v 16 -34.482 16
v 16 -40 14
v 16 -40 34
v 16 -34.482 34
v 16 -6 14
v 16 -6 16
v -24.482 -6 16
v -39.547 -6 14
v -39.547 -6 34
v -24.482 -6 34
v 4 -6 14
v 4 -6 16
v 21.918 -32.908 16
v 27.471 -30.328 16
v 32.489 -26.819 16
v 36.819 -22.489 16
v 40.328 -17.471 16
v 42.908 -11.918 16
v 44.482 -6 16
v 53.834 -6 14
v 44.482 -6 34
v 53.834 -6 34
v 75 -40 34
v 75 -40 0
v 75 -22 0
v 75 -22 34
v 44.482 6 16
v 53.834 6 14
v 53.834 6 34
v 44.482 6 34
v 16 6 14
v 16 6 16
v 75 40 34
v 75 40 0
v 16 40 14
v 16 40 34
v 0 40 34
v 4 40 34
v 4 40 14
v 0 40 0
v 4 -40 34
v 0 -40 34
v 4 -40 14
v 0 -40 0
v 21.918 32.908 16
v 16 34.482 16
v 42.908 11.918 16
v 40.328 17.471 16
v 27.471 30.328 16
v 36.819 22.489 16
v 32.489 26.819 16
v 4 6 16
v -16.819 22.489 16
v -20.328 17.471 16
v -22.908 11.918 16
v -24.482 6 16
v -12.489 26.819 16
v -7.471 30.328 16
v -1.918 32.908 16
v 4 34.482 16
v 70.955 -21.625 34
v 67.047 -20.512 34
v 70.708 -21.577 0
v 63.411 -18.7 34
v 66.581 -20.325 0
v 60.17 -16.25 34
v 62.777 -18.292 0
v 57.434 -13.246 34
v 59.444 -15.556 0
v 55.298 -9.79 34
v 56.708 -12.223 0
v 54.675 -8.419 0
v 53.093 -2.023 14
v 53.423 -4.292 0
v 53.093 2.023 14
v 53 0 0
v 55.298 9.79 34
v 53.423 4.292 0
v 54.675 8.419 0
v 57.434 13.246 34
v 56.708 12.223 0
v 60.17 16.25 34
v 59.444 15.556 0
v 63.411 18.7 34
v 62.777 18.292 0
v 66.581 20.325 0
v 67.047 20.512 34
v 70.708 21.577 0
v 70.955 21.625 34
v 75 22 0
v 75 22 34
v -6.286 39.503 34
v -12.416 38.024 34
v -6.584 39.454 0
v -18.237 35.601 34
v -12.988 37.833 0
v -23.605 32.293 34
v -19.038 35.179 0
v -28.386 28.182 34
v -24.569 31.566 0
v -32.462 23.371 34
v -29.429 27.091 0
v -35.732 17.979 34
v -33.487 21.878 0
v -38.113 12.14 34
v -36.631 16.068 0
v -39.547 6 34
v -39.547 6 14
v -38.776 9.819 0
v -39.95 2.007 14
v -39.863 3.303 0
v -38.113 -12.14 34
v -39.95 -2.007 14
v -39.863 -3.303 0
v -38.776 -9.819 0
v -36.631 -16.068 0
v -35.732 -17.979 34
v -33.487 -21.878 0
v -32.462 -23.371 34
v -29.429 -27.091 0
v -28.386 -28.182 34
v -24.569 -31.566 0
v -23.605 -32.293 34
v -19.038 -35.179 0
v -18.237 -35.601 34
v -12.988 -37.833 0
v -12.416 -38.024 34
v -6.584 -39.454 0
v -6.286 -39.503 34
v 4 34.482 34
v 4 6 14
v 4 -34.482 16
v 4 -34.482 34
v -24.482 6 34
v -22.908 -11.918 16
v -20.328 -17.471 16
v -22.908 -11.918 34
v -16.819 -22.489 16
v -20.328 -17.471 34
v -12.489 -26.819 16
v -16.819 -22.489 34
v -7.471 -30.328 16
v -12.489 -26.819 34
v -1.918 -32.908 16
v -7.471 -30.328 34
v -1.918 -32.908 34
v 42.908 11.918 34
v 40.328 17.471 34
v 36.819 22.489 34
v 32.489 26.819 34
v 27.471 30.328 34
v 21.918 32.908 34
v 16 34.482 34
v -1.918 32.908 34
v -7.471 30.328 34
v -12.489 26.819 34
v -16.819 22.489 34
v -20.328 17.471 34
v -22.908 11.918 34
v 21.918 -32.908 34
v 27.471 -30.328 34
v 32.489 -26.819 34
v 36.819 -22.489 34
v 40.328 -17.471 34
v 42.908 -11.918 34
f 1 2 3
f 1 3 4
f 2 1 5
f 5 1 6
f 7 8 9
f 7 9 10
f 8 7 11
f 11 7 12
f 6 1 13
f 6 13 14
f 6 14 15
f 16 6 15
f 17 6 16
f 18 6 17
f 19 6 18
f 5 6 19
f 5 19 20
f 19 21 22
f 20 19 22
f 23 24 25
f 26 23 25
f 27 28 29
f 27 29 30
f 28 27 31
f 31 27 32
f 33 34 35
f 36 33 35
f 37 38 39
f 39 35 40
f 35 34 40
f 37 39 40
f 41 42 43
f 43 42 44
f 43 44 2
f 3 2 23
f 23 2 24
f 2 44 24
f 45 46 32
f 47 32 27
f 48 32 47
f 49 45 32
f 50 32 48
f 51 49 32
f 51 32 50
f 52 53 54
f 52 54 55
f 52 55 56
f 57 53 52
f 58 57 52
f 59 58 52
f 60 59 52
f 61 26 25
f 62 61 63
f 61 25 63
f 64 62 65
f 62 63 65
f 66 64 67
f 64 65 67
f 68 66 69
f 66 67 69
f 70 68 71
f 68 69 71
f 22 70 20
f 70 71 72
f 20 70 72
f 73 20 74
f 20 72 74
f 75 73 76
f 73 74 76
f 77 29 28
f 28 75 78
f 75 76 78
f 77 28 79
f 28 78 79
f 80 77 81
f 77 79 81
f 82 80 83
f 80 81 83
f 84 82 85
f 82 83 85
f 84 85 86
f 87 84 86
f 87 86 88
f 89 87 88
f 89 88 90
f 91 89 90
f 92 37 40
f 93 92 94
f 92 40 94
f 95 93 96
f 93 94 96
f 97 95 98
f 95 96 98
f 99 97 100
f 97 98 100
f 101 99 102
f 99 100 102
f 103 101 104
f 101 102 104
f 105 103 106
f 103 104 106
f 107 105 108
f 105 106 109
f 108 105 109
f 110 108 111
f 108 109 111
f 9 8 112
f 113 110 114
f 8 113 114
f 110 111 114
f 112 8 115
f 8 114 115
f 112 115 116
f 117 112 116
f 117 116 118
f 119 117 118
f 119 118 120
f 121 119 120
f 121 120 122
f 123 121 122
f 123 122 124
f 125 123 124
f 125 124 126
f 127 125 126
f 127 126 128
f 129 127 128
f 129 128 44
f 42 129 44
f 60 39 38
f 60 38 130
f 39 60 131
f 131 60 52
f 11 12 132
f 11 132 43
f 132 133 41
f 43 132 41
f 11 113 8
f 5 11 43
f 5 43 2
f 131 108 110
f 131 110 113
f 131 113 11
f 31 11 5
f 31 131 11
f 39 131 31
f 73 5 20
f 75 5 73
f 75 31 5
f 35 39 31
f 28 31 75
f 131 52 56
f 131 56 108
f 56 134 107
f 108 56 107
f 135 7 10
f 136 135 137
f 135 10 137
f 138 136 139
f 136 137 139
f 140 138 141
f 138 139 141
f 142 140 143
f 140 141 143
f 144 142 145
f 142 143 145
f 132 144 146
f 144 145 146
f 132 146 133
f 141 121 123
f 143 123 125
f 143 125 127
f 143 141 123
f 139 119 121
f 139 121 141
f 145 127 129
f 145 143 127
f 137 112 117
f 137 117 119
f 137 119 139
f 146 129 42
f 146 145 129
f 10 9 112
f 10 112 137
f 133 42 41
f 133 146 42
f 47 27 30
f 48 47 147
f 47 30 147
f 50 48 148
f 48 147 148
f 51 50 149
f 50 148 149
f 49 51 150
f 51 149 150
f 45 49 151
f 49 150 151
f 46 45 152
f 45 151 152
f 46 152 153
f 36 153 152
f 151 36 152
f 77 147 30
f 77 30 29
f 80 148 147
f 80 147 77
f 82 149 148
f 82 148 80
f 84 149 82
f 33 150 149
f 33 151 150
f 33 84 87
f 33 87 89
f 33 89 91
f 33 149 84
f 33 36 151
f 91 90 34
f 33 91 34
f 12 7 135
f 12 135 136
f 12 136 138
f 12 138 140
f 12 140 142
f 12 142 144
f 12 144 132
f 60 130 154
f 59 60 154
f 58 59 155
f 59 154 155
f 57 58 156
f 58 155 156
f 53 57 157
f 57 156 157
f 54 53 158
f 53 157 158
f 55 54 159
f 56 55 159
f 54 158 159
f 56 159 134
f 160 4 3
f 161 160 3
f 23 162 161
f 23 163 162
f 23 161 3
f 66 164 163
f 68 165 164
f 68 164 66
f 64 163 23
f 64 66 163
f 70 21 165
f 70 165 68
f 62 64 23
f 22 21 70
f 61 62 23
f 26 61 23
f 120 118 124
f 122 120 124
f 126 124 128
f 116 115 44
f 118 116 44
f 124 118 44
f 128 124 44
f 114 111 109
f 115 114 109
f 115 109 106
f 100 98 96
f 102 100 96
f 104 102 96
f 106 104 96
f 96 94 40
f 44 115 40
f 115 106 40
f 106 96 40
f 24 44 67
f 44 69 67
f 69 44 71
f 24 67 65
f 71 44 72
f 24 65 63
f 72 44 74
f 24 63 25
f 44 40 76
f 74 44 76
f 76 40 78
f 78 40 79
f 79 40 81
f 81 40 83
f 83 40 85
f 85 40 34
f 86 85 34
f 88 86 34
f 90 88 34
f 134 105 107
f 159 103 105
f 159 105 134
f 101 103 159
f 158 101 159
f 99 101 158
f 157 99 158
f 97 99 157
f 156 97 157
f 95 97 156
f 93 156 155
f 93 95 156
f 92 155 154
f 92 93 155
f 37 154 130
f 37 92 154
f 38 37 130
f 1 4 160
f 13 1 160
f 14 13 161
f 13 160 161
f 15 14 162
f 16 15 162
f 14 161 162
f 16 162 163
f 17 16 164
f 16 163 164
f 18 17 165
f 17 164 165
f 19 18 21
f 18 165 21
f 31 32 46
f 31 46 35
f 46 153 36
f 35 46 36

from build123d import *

# Parameters (mm, degrees)
BOSS_EXTRUDE1_DEPTH = 34
SKETCH3_R           = 35
CUT_EXTRUDE1_DEPTH  = 18
CUT_EXTRUDE2_DEPTH  = 20


with BuildPart() as part:
    # Sketch1 → Boss-Extrude1 (new body)
    with BuildSketch(Plane.XY):
        with BuildLine():
            Line((75, 40), (0, 40))
            ThreePointArc((0, 40), (-40, 0), (0, -40))
            Line((0, -40), (75, -40))
            Line((75, -40), (75, -22))
            ThreePointArc((75, -22), (53, 0), (75, 22))
            Line((75, 22), (75, 40))
        make_face()
    extrude(amount=BOSS_EXTRUDE1_DEPTH)

    # Sketch3 → Cut-Extrude1 (cut)
    with BuildSketch(Plane.XY.offset(34)):
        with Locations((10, 0)):
            Circle(SKETCH3_R)
    extrude(amount=-CUT_EXTRUDE1_DEPTH, mode=Mode.SUBTRACT)

    # Sketch4 → Cut-Extrude2 (cut)
    with BuildSketch(Plane.XY.offset(34)):
        with BuildLine():
            ThreePointArc((53.833989511, -6), (53, 0), (53.833989511, 6))
            Line((53.833989511, 6), (44.481879299, 6))
            Line((44.481879299, 6), (16, 6))
            Line((16, 6), (16, 34.481879299))
            Line((16, 34.481879299), (16, 40))
            Line((16, 40), (4, 40))
            Line((4, 40), (4, 34.481879299))
            Line((4, 34.481879299), (4, 6))
            Line((4, 6), (-24.481879299, 6))
            Line((-24.481879299, 6), (-39.547439867, 6))
            ThreePointArc((-39.547439867, 6), (-40, 0), (-39.547439867, -6))
            Line((-39.547439867, -6), (-24.481879299, -6))
            Line((-24.481879299, -6), (4, -6))
            Line((4, -6), (4, -34.481879299))
            Line((4, -34.481879299), (4, -40))
            Line((4, -40), (16, -40))
            Line((16, -40), (16, -34.481879299))
            Line((16, -34.481879299), (16, -6))
            Line((16, -6), (44.481879299, -6))
            Line((44.481879299, -6), (53.833989511, -6))
        make_face()
    extrude(amount=-CUT_EXTRUDE2_DEPTH, mode=Mode.SUBTRACT)


solid = part.part
